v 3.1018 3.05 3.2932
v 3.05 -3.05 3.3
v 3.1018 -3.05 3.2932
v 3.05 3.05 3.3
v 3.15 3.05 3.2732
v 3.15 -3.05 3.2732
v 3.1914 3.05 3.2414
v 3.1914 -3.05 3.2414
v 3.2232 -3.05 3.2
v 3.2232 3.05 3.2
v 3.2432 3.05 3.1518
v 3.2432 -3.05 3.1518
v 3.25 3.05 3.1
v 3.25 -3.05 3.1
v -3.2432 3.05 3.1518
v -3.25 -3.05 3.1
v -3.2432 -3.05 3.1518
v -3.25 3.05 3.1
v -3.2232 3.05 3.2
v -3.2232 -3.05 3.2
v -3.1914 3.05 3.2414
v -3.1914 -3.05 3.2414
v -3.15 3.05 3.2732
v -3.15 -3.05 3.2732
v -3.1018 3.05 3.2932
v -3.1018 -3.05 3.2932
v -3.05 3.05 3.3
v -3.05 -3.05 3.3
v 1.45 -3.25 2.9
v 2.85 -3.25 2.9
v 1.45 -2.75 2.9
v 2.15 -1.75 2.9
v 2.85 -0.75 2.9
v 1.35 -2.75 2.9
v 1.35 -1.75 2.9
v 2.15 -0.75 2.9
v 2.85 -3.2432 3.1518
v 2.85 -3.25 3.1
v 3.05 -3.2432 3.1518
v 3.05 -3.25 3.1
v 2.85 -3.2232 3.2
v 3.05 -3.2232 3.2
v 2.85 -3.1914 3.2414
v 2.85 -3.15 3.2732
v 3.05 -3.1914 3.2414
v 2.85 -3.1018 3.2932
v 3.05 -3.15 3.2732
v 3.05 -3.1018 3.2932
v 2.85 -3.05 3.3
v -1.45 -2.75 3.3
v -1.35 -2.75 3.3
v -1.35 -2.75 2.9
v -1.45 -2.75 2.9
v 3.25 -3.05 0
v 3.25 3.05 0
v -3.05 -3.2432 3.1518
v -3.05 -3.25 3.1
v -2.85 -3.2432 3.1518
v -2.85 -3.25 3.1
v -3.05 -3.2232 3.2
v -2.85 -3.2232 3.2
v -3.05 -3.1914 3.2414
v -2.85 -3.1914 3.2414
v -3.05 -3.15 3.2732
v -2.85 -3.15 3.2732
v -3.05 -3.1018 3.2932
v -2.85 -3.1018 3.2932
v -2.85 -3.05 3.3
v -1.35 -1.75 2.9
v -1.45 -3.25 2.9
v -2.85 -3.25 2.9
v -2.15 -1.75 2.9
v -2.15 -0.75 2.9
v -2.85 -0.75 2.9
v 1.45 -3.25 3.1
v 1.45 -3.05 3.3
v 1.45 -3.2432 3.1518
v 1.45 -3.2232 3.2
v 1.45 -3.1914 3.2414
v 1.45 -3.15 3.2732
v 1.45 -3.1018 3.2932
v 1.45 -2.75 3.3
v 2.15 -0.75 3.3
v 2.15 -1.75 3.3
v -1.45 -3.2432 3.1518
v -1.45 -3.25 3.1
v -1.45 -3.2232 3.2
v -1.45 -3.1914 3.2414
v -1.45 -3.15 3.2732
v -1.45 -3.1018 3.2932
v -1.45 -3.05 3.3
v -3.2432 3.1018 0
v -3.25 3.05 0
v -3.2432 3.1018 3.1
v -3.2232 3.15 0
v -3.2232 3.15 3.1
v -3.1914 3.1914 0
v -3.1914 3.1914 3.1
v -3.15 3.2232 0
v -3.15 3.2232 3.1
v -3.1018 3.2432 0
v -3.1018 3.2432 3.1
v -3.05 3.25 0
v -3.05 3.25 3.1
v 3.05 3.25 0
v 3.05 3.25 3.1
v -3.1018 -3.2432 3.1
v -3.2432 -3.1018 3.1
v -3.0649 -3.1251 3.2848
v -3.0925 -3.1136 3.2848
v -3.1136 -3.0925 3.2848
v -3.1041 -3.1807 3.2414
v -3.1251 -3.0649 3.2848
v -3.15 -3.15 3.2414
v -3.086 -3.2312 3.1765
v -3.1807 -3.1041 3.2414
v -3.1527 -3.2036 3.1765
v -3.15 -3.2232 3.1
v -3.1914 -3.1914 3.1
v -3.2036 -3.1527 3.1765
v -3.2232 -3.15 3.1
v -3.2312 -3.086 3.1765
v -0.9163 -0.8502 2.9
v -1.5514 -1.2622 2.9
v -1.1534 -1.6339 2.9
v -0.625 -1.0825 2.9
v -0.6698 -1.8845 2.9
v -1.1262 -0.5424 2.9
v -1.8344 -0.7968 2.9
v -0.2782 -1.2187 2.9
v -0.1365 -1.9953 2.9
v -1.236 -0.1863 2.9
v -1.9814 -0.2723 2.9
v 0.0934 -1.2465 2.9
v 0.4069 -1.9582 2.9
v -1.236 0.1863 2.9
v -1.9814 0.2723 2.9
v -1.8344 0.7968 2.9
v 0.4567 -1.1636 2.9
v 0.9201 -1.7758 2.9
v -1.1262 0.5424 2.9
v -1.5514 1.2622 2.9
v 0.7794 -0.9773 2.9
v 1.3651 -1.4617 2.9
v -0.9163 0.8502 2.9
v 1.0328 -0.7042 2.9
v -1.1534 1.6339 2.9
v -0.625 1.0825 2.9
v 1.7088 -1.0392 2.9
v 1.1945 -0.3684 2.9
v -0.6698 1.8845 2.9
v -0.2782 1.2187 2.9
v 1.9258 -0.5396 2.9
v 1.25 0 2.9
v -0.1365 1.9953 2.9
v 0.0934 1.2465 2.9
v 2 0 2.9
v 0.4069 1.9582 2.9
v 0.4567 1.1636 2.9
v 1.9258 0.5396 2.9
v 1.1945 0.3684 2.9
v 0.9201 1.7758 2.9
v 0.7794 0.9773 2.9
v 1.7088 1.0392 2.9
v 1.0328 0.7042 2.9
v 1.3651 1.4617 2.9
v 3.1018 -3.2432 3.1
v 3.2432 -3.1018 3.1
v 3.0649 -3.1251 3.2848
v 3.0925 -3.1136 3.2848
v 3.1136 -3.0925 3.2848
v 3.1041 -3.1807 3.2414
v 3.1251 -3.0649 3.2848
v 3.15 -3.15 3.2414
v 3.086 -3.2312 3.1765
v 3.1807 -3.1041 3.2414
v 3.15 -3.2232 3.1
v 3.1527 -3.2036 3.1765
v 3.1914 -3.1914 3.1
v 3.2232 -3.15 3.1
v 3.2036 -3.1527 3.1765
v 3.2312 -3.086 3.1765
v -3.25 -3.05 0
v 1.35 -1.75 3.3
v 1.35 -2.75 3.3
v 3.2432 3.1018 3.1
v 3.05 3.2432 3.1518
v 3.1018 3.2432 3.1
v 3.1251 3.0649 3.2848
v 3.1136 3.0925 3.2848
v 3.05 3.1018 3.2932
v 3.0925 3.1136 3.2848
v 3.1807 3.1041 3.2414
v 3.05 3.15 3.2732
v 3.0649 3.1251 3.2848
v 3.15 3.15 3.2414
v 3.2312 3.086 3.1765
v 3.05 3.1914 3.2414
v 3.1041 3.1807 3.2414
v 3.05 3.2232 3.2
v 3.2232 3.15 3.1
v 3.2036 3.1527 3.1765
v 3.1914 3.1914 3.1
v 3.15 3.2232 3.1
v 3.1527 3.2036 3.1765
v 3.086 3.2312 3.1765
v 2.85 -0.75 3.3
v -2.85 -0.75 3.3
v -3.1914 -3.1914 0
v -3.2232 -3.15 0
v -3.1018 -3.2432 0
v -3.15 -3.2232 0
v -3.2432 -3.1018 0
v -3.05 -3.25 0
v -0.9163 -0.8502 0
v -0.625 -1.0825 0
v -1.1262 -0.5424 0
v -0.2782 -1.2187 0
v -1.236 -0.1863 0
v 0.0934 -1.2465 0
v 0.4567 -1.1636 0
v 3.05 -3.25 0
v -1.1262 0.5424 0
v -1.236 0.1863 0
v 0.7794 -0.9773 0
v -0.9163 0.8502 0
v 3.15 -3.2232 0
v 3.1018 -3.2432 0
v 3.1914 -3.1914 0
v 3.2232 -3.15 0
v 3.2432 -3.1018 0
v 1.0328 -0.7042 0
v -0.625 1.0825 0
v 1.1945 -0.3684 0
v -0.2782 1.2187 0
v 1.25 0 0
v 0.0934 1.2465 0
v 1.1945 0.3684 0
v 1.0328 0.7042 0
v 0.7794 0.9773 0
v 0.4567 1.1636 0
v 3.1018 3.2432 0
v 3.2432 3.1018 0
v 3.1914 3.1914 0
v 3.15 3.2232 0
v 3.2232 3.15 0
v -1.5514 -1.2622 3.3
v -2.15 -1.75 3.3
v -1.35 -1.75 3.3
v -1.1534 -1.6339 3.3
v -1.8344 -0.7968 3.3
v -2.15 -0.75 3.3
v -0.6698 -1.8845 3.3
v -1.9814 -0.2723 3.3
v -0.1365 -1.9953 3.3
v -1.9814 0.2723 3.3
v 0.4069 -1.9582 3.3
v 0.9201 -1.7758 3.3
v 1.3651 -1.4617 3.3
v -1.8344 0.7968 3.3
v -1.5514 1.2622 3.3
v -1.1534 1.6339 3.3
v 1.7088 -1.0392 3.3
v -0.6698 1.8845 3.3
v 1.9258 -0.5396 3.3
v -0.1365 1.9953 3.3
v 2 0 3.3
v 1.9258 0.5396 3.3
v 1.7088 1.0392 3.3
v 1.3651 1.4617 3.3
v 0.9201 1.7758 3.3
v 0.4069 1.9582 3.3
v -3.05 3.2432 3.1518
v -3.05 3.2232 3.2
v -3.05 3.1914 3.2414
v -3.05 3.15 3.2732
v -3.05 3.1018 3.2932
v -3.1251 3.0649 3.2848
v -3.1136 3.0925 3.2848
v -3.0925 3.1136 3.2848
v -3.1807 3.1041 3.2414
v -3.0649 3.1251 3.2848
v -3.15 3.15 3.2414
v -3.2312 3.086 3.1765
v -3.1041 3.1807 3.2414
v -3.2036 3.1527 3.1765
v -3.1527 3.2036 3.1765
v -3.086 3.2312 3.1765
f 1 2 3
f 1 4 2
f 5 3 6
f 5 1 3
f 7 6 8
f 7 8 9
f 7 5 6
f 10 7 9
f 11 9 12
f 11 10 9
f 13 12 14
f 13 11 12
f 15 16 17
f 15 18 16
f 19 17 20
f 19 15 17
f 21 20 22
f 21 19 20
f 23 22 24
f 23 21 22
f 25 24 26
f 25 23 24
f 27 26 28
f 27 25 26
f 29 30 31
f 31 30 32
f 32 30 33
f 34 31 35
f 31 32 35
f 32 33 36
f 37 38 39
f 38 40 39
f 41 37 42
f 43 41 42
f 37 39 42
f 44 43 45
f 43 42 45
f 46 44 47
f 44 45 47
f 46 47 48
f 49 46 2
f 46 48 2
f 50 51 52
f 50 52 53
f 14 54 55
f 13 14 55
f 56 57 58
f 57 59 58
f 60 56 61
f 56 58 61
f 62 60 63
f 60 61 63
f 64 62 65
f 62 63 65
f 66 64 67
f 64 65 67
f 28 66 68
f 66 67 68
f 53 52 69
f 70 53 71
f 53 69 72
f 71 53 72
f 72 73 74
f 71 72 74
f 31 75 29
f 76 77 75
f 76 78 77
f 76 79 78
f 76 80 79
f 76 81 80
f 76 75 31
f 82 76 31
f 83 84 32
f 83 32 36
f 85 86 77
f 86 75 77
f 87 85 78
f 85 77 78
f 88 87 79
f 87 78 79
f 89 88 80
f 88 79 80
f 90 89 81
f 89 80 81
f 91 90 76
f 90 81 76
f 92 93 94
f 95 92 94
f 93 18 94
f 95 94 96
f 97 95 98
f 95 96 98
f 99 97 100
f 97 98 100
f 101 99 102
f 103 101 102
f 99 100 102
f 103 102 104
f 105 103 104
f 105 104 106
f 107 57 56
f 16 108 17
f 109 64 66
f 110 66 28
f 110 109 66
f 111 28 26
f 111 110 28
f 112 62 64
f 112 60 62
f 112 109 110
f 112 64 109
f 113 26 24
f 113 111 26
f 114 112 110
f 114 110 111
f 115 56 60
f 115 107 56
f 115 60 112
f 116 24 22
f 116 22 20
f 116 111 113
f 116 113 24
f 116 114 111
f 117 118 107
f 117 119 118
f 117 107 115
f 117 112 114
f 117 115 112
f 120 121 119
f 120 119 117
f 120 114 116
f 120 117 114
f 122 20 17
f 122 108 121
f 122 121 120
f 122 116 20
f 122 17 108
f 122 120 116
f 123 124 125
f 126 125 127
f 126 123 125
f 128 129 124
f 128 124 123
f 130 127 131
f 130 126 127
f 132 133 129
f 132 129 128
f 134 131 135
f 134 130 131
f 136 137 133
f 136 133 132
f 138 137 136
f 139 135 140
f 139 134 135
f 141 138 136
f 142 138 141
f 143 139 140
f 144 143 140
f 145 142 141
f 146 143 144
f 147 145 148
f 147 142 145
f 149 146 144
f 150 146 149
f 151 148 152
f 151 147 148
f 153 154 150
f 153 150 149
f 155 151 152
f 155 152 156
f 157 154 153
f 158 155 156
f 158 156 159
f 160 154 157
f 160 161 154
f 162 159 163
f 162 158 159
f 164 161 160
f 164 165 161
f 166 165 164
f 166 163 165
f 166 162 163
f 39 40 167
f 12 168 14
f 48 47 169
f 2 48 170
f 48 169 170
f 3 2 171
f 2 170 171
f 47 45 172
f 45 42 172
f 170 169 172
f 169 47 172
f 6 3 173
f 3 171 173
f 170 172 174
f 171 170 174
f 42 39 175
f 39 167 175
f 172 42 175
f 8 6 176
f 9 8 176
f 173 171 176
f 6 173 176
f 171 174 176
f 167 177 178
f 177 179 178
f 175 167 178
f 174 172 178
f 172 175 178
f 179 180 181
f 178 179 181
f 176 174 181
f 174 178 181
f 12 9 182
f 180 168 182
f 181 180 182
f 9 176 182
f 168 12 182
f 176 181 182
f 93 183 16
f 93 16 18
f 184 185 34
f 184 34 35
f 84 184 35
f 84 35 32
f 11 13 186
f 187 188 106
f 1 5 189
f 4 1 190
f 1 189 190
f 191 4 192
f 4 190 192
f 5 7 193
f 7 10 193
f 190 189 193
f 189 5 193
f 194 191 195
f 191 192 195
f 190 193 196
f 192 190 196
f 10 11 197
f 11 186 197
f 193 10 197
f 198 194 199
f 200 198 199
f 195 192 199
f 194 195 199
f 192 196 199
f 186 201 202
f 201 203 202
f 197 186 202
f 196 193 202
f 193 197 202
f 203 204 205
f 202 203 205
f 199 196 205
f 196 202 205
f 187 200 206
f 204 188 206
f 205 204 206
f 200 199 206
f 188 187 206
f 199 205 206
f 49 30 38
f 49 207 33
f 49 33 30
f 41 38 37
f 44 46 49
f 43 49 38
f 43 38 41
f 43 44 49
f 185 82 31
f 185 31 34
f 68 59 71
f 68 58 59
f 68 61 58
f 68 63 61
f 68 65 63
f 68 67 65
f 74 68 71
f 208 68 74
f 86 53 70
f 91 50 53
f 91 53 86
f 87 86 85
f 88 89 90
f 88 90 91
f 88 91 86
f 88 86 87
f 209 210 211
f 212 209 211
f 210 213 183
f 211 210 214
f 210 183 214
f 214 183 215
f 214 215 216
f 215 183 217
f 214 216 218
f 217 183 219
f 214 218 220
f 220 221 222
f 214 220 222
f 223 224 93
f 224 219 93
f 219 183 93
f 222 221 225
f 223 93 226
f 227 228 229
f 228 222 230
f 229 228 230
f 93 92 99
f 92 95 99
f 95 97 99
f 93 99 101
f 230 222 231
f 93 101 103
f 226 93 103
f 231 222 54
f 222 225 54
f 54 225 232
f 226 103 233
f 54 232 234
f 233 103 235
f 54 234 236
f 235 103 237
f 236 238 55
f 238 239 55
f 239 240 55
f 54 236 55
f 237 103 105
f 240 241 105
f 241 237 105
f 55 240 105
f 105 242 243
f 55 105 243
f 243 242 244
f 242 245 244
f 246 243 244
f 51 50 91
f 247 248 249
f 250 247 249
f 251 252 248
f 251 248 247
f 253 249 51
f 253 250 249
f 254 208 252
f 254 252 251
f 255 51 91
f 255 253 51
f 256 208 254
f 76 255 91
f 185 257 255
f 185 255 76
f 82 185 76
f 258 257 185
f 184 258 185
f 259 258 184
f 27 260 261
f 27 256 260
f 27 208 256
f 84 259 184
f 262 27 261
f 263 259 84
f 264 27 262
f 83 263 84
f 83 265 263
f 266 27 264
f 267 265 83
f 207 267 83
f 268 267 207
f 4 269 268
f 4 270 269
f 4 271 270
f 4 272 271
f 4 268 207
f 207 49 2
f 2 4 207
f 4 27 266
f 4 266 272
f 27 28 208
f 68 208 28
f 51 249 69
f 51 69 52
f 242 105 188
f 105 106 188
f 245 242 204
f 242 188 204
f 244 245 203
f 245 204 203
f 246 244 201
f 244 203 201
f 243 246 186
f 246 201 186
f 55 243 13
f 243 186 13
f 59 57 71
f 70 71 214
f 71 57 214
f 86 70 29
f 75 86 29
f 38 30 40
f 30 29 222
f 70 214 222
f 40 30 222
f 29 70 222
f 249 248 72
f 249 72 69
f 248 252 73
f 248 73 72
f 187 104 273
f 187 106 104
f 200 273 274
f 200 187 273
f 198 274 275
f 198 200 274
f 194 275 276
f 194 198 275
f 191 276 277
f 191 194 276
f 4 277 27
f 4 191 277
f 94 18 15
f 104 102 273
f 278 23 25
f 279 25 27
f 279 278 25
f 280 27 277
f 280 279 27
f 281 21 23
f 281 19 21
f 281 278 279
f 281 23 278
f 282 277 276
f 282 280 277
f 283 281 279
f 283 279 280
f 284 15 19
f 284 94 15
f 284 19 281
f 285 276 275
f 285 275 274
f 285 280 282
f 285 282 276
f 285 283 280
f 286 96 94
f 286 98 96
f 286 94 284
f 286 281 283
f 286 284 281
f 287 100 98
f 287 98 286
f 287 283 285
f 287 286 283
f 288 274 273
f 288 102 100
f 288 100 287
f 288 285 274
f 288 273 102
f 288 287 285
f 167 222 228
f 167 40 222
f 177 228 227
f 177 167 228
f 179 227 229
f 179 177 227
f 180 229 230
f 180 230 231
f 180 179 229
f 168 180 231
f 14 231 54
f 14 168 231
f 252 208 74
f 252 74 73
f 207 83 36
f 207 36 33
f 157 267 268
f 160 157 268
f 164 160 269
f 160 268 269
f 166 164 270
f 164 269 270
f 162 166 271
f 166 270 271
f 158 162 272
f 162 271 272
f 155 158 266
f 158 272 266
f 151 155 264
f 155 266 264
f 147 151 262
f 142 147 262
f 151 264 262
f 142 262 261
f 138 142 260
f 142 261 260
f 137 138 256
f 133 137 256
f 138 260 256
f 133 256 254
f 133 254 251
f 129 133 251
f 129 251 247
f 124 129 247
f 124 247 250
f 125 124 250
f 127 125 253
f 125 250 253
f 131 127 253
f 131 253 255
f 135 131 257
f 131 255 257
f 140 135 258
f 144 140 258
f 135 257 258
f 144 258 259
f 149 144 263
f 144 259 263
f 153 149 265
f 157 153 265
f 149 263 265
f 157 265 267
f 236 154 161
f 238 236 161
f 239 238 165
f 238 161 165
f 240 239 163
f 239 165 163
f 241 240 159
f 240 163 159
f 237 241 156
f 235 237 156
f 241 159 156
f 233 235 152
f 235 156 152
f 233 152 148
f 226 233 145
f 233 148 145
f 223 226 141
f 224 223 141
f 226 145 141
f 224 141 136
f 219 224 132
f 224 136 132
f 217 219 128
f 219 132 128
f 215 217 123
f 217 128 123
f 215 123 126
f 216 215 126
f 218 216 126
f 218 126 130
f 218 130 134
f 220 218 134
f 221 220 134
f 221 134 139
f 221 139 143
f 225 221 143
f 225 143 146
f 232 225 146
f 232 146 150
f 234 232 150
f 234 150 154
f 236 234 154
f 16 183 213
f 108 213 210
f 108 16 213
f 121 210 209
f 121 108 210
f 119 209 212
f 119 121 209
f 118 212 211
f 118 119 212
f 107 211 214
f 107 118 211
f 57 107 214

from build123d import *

# Parameters (mm, degrees)
SKETCH_W        = 6.5
SKETCH_H        = 6.5
PAD_DEPTH       = 3.3
SKETCH001_R     = 1.25
POCKET_DEPTH    = 3.3
SKETCH002_R     = 2
POCKET001_DEPTH = 0.4
FILLET_R        = 0.2


with BuildPart() as part:
    # Sketch → Pad (new body)
    with BuildSketch(Plane.XY):
        Rectangle(SKETCH_W, SKETCH_H)
    extrude(amount=PAD_DEPTH)

    # Sketch001 (on Face6 of Pad) → Pocket (cut)
    with BuildSketch(Plane.XY.offset(3.3)):
        Circle(SKETCH001_R)
    extrude(amount=-POCKET_DEPTH, mode=Mode.SUBTRACT)

    # Sketch002 (on Face5 of Pocket) → Pocket001 (cut)
    with BuildSketch(Plane.XY.offset(3.3)):
        Circle(SKETCH002_R)
        Polygon((-2.85, -0.75), (-2.15, -0.75), (-2.15, -1.75), (-1.35, -1.75), (-1.35, -2.75), (-1.45, -2.75), (-1.45, -3.25), (-2.85, -3.25), align=None)
        Polygon((2.15, -0.75), (2.85, -0.75), (2.85, -3.25), (1.45, -3.25), (1.45, -2.75), (1.35, -2.75), (1.35, -1.75), (2.15, -1.75), align=None)
    extrude(amount=-POCKET001_DEPTH, mode=Mode.SUBTRACT)

    # Fillet
    fillet_edges = [part.edges().sort_by_distance(p)[0] for p in [
        (-3.25, -3.25, 1.65),
        (3.25, -3.25, 1.65),
        (3.25, 3.25, 1.65),
        (-3.25, 3.25, 1.65),
        (0, -3.25, 3.3),
        (-3.05, -3.25, 3.3),
        (3.05, -3.25, 3.3),
        (3.25, 0, 3.3),
        (-3.25, 0, 3.3),
        (0, 3.25, 3.3),
    ]]
    fillet(fillet_edges, radius=FILLET_R)


solid = part.part
